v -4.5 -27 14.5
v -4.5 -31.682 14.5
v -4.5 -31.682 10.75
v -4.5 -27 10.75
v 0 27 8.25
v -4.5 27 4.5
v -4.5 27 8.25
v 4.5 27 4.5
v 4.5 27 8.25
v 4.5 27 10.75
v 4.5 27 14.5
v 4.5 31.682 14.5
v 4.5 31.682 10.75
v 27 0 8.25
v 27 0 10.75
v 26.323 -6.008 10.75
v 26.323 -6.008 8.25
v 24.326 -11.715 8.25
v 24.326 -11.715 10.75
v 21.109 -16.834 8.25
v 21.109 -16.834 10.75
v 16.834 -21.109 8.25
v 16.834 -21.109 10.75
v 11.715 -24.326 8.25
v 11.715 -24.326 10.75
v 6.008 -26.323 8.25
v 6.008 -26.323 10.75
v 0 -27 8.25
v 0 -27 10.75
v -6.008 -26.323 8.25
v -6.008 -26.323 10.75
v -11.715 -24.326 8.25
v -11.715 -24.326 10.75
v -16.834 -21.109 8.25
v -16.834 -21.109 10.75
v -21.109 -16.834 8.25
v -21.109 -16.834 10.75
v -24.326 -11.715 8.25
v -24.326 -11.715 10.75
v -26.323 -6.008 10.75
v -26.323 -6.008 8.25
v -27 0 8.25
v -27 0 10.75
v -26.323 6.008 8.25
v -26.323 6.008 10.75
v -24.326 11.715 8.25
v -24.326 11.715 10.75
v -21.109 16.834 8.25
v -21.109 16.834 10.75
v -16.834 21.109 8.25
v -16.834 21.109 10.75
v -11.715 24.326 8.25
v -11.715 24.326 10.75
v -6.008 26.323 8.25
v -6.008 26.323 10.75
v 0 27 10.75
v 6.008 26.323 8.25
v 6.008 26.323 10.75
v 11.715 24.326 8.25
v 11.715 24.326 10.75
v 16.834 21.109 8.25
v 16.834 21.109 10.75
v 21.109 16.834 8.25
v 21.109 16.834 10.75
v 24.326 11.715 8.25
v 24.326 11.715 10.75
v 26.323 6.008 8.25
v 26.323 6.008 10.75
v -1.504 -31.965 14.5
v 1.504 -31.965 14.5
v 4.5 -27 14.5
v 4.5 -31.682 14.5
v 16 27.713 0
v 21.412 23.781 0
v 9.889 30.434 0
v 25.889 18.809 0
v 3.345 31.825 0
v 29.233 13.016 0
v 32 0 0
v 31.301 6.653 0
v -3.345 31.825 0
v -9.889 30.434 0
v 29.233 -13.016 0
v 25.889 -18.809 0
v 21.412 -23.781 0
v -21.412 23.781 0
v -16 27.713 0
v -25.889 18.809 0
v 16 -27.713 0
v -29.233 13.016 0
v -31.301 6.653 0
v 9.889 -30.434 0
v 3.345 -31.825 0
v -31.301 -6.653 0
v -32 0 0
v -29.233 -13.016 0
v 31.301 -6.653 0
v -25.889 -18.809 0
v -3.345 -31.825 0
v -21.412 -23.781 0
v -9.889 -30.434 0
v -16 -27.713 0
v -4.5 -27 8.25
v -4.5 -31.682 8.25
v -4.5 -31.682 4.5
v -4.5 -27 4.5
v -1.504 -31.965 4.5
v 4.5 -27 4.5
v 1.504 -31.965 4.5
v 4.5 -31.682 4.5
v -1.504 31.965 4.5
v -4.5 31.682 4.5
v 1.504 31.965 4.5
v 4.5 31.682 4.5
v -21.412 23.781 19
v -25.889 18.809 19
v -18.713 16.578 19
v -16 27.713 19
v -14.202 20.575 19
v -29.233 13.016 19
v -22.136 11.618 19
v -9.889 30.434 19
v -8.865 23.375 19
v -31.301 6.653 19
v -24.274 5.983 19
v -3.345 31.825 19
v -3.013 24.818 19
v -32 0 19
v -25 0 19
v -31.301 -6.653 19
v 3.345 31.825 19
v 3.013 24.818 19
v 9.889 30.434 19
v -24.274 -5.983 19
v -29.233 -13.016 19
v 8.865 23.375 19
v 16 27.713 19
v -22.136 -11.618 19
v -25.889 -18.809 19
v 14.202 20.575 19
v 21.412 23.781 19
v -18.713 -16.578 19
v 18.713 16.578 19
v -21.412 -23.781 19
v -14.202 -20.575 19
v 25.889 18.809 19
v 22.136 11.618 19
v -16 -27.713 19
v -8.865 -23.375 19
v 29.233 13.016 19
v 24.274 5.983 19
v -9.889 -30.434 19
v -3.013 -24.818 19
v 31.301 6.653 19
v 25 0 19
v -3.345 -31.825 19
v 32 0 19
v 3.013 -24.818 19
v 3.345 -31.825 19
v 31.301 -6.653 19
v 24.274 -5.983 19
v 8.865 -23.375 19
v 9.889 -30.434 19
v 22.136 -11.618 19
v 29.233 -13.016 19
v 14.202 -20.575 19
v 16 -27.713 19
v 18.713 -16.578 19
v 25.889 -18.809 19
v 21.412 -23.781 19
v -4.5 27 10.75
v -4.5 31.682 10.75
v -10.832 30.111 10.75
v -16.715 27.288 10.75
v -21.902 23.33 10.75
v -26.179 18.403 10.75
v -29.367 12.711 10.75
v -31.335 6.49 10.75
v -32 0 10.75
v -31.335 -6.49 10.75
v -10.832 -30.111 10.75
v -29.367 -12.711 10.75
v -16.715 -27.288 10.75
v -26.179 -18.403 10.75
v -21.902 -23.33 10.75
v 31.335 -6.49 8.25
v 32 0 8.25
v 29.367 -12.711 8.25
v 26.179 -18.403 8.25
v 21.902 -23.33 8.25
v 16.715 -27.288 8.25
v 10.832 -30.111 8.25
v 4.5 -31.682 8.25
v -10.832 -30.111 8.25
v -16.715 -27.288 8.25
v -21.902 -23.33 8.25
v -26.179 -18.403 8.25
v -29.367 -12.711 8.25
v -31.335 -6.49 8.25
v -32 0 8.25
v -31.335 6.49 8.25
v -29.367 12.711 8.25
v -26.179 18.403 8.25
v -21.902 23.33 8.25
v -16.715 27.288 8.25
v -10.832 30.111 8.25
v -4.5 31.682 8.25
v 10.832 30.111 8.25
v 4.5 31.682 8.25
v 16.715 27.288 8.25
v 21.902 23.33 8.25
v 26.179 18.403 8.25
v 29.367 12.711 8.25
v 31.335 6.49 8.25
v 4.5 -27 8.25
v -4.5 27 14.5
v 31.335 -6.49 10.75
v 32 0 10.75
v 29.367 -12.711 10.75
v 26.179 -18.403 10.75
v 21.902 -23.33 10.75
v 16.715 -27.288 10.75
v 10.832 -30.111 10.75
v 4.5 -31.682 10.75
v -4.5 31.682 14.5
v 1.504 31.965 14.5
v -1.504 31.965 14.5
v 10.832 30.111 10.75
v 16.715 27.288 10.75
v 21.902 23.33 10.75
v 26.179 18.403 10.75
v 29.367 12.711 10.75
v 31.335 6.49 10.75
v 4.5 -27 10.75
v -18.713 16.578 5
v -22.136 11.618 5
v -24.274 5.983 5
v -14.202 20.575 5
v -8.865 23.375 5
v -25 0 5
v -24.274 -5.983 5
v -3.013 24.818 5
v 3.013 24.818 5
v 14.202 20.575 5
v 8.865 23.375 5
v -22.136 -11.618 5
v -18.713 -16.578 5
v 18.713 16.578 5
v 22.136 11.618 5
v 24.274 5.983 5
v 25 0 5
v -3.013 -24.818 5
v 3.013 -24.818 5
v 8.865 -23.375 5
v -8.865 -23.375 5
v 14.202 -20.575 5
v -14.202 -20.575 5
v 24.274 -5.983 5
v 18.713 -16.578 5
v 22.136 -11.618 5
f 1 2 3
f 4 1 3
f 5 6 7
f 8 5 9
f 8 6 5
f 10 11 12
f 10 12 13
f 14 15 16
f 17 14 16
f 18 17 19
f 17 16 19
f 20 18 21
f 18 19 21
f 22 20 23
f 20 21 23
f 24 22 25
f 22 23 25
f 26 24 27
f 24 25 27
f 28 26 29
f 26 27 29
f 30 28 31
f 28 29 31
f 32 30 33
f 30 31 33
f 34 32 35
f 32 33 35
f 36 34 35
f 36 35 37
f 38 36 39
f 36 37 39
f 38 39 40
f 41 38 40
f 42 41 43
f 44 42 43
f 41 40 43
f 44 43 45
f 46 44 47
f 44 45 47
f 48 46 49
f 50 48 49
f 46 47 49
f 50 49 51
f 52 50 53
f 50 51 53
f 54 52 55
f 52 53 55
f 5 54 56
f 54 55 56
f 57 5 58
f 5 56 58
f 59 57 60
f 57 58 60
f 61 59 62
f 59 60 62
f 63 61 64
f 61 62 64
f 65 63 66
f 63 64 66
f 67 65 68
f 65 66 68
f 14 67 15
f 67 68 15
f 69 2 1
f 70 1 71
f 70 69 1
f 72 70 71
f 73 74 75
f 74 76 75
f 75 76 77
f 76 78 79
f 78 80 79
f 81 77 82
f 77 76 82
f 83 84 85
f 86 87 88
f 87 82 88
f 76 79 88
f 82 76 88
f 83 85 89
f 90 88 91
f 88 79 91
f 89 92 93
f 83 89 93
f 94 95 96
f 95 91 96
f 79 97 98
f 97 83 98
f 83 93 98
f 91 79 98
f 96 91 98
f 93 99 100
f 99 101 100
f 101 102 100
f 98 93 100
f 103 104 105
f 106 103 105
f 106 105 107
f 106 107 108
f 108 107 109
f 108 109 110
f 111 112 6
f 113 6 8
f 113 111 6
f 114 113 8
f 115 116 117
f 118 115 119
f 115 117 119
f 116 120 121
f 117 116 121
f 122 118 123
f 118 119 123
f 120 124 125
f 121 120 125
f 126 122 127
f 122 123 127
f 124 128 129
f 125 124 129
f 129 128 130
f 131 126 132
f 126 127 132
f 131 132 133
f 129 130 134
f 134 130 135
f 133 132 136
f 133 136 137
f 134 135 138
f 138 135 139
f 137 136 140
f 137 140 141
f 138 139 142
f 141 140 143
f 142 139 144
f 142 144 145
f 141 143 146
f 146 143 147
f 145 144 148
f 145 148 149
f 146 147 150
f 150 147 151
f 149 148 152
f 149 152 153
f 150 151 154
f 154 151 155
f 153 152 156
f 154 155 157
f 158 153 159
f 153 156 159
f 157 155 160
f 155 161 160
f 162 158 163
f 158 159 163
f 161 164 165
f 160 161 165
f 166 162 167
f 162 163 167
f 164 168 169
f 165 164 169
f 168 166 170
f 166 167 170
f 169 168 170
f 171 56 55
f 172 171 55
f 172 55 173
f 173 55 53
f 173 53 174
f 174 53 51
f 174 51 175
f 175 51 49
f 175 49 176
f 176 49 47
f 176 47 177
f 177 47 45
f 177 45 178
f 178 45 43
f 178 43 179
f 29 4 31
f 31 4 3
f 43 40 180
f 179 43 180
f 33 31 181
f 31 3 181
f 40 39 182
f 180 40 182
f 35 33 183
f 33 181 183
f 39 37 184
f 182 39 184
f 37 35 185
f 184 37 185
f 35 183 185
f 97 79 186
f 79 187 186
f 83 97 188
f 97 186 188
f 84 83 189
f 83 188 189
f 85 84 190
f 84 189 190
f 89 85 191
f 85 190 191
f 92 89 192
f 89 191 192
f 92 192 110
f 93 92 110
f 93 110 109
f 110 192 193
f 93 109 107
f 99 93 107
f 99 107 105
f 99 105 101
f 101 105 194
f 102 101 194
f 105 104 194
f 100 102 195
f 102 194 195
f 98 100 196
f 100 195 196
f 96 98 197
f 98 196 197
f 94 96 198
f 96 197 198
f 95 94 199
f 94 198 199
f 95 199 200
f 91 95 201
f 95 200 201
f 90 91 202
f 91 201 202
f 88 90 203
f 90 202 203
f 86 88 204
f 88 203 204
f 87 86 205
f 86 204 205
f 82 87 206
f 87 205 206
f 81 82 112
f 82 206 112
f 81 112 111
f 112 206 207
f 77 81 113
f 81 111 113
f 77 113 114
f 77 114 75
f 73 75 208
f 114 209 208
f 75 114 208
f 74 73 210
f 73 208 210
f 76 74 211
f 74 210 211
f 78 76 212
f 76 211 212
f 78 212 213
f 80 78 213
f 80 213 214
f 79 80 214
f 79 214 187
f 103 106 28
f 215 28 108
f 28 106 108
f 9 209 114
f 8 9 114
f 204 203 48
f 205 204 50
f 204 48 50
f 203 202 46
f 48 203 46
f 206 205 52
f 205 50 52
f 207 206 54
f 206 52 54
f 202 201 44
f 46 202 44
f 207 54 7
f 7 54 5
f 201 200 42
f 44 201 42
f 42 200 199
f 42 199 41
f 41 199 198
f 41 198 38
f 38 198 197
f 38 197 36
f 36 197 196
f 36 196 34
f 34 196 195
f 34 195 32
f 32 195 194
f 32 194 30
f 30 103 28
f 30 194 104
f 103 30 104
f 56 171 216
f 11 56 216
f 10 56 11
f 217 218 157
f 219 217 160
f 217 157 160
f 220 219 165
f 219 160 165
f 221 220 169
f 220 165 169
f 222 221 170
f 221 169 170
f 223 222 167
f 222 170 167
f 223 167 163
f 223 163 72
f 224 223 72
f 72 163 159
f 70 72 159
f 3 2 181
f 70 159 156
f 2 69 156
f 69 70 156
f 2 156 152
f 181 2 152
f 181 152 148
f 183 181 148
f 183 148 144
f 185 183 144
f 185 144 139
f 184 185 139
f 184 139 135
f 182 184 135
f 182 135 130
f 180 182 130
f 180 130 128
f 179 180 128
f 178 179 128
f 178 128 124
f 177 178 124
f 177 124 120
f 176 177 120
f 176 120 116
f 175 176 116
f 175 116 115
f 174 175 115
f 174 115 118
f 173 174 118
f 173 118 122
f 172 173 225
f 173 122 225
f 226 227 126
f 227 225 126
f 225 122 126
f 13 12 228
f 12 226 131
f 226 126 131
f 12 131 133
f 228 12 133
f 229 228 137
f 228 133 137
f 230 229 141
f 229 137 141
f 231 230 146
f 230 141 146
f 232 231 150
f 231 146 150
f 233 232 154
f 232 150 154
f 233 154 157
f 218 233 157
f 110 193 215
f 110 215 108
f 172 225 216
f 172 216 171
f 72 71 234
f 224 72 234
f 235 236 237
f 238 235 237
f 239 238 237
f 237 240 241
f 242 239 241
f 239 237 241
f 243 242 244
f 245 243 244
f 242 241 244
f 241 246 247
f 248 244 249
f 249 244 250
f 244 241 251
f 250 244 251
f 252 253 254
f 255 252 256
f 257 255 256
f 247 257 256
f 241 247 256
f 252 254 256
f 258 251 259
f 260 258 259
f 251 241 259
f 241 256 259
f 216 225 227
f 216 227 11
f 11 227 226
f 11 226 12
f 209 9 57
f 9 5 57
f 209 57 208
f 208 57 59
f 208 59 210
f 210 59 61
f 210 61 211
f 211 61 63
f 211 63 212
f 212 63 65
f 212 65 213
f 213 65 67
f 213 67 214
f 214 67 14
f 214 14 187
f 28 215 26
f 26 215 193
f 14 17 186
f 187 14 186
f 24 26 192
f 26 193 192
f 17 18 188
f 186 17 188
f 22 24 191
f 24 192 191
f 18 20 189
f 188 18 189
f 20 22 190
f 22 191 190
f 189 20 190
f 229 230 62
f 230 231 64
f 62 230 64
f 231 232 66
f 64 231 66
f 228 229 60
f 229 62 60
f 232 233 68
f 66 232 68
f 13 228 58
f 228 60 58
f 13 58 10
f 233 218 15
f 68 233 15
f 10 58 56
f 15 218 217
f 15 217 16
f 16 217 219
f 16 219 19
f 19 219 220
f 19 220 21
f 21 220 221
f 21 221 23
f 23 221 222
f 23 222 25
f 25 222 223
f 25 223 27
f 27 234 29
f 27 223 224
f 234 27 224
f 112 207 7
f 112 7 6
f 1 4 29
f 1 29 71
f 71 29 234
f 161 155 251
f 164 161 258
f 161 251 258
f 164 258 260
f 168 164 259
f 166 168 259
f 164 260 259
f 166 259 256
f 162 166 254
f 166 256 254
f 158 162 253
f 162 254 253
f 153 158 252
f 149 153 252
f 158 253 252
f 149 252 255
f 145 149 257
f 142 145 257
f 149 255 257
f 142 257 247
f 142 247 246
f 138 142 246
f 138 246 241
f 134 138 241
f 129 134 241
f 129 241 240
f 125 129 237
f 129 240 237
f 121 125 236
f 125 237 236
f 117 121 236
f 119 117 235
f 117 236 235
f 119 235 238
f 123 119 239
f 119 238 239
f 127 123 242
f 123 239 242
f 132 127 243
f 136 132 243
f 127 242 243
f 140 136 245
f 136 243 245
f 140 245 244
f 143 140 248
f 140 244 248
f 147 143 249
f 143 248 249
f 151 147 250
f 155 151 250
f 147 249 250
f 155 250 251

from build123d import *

# Parameters (mm, degrees)
SKETCH7_W          = 9
SKETCH7_H          = 10
CUT_EXTRUDE1_DEPTH = 5


with BuildPart() as part:
    # Sketch2 → Revolve1 (revolve)
    with BuildSketch(Plane(origin=(0, 0, 0), x_dir=(0, 0, -1), z_dir=(1, 0, 0)), mode=Mode.PRIVATE) as revolve1_sk:
        Polygon((0, 0), (0, 32), (-8.25, 32), (-8.25, 27), (-10.75, 27), (-10.75, 32), (-19, 32), (-19, 25), (-5, 25), (-5, 0), align=None)
    revolve(revolve1_sk.sketch.rotate(Axis((0, 0, 5), (0, 0, -1)), 90), axis=Axis((0, 0, 5), (0, 0, -1)))

    # Sketch7 → Cut-Extrude1 (cut)
    with BuildSketch(Plane(origin=(0, 32, 0), x_dir=(1, 0, 0), z_dir=(0, 1, 0))):
        with Locations((0, -9.5)):
            Rectangle(SKETCH7_W, SKETCH7_H)
    cut_extrude1 = extrude(amount=-CUT_EXTRUDE1_DEPTH, mode=Mode.SUBTRACT)

    # Mirror1: Cut-Extrude1 across plane
    add(cut_extrude1.mirror(Plane.ZX), mode=Mode.SUBTRACT)


solid = part.part
